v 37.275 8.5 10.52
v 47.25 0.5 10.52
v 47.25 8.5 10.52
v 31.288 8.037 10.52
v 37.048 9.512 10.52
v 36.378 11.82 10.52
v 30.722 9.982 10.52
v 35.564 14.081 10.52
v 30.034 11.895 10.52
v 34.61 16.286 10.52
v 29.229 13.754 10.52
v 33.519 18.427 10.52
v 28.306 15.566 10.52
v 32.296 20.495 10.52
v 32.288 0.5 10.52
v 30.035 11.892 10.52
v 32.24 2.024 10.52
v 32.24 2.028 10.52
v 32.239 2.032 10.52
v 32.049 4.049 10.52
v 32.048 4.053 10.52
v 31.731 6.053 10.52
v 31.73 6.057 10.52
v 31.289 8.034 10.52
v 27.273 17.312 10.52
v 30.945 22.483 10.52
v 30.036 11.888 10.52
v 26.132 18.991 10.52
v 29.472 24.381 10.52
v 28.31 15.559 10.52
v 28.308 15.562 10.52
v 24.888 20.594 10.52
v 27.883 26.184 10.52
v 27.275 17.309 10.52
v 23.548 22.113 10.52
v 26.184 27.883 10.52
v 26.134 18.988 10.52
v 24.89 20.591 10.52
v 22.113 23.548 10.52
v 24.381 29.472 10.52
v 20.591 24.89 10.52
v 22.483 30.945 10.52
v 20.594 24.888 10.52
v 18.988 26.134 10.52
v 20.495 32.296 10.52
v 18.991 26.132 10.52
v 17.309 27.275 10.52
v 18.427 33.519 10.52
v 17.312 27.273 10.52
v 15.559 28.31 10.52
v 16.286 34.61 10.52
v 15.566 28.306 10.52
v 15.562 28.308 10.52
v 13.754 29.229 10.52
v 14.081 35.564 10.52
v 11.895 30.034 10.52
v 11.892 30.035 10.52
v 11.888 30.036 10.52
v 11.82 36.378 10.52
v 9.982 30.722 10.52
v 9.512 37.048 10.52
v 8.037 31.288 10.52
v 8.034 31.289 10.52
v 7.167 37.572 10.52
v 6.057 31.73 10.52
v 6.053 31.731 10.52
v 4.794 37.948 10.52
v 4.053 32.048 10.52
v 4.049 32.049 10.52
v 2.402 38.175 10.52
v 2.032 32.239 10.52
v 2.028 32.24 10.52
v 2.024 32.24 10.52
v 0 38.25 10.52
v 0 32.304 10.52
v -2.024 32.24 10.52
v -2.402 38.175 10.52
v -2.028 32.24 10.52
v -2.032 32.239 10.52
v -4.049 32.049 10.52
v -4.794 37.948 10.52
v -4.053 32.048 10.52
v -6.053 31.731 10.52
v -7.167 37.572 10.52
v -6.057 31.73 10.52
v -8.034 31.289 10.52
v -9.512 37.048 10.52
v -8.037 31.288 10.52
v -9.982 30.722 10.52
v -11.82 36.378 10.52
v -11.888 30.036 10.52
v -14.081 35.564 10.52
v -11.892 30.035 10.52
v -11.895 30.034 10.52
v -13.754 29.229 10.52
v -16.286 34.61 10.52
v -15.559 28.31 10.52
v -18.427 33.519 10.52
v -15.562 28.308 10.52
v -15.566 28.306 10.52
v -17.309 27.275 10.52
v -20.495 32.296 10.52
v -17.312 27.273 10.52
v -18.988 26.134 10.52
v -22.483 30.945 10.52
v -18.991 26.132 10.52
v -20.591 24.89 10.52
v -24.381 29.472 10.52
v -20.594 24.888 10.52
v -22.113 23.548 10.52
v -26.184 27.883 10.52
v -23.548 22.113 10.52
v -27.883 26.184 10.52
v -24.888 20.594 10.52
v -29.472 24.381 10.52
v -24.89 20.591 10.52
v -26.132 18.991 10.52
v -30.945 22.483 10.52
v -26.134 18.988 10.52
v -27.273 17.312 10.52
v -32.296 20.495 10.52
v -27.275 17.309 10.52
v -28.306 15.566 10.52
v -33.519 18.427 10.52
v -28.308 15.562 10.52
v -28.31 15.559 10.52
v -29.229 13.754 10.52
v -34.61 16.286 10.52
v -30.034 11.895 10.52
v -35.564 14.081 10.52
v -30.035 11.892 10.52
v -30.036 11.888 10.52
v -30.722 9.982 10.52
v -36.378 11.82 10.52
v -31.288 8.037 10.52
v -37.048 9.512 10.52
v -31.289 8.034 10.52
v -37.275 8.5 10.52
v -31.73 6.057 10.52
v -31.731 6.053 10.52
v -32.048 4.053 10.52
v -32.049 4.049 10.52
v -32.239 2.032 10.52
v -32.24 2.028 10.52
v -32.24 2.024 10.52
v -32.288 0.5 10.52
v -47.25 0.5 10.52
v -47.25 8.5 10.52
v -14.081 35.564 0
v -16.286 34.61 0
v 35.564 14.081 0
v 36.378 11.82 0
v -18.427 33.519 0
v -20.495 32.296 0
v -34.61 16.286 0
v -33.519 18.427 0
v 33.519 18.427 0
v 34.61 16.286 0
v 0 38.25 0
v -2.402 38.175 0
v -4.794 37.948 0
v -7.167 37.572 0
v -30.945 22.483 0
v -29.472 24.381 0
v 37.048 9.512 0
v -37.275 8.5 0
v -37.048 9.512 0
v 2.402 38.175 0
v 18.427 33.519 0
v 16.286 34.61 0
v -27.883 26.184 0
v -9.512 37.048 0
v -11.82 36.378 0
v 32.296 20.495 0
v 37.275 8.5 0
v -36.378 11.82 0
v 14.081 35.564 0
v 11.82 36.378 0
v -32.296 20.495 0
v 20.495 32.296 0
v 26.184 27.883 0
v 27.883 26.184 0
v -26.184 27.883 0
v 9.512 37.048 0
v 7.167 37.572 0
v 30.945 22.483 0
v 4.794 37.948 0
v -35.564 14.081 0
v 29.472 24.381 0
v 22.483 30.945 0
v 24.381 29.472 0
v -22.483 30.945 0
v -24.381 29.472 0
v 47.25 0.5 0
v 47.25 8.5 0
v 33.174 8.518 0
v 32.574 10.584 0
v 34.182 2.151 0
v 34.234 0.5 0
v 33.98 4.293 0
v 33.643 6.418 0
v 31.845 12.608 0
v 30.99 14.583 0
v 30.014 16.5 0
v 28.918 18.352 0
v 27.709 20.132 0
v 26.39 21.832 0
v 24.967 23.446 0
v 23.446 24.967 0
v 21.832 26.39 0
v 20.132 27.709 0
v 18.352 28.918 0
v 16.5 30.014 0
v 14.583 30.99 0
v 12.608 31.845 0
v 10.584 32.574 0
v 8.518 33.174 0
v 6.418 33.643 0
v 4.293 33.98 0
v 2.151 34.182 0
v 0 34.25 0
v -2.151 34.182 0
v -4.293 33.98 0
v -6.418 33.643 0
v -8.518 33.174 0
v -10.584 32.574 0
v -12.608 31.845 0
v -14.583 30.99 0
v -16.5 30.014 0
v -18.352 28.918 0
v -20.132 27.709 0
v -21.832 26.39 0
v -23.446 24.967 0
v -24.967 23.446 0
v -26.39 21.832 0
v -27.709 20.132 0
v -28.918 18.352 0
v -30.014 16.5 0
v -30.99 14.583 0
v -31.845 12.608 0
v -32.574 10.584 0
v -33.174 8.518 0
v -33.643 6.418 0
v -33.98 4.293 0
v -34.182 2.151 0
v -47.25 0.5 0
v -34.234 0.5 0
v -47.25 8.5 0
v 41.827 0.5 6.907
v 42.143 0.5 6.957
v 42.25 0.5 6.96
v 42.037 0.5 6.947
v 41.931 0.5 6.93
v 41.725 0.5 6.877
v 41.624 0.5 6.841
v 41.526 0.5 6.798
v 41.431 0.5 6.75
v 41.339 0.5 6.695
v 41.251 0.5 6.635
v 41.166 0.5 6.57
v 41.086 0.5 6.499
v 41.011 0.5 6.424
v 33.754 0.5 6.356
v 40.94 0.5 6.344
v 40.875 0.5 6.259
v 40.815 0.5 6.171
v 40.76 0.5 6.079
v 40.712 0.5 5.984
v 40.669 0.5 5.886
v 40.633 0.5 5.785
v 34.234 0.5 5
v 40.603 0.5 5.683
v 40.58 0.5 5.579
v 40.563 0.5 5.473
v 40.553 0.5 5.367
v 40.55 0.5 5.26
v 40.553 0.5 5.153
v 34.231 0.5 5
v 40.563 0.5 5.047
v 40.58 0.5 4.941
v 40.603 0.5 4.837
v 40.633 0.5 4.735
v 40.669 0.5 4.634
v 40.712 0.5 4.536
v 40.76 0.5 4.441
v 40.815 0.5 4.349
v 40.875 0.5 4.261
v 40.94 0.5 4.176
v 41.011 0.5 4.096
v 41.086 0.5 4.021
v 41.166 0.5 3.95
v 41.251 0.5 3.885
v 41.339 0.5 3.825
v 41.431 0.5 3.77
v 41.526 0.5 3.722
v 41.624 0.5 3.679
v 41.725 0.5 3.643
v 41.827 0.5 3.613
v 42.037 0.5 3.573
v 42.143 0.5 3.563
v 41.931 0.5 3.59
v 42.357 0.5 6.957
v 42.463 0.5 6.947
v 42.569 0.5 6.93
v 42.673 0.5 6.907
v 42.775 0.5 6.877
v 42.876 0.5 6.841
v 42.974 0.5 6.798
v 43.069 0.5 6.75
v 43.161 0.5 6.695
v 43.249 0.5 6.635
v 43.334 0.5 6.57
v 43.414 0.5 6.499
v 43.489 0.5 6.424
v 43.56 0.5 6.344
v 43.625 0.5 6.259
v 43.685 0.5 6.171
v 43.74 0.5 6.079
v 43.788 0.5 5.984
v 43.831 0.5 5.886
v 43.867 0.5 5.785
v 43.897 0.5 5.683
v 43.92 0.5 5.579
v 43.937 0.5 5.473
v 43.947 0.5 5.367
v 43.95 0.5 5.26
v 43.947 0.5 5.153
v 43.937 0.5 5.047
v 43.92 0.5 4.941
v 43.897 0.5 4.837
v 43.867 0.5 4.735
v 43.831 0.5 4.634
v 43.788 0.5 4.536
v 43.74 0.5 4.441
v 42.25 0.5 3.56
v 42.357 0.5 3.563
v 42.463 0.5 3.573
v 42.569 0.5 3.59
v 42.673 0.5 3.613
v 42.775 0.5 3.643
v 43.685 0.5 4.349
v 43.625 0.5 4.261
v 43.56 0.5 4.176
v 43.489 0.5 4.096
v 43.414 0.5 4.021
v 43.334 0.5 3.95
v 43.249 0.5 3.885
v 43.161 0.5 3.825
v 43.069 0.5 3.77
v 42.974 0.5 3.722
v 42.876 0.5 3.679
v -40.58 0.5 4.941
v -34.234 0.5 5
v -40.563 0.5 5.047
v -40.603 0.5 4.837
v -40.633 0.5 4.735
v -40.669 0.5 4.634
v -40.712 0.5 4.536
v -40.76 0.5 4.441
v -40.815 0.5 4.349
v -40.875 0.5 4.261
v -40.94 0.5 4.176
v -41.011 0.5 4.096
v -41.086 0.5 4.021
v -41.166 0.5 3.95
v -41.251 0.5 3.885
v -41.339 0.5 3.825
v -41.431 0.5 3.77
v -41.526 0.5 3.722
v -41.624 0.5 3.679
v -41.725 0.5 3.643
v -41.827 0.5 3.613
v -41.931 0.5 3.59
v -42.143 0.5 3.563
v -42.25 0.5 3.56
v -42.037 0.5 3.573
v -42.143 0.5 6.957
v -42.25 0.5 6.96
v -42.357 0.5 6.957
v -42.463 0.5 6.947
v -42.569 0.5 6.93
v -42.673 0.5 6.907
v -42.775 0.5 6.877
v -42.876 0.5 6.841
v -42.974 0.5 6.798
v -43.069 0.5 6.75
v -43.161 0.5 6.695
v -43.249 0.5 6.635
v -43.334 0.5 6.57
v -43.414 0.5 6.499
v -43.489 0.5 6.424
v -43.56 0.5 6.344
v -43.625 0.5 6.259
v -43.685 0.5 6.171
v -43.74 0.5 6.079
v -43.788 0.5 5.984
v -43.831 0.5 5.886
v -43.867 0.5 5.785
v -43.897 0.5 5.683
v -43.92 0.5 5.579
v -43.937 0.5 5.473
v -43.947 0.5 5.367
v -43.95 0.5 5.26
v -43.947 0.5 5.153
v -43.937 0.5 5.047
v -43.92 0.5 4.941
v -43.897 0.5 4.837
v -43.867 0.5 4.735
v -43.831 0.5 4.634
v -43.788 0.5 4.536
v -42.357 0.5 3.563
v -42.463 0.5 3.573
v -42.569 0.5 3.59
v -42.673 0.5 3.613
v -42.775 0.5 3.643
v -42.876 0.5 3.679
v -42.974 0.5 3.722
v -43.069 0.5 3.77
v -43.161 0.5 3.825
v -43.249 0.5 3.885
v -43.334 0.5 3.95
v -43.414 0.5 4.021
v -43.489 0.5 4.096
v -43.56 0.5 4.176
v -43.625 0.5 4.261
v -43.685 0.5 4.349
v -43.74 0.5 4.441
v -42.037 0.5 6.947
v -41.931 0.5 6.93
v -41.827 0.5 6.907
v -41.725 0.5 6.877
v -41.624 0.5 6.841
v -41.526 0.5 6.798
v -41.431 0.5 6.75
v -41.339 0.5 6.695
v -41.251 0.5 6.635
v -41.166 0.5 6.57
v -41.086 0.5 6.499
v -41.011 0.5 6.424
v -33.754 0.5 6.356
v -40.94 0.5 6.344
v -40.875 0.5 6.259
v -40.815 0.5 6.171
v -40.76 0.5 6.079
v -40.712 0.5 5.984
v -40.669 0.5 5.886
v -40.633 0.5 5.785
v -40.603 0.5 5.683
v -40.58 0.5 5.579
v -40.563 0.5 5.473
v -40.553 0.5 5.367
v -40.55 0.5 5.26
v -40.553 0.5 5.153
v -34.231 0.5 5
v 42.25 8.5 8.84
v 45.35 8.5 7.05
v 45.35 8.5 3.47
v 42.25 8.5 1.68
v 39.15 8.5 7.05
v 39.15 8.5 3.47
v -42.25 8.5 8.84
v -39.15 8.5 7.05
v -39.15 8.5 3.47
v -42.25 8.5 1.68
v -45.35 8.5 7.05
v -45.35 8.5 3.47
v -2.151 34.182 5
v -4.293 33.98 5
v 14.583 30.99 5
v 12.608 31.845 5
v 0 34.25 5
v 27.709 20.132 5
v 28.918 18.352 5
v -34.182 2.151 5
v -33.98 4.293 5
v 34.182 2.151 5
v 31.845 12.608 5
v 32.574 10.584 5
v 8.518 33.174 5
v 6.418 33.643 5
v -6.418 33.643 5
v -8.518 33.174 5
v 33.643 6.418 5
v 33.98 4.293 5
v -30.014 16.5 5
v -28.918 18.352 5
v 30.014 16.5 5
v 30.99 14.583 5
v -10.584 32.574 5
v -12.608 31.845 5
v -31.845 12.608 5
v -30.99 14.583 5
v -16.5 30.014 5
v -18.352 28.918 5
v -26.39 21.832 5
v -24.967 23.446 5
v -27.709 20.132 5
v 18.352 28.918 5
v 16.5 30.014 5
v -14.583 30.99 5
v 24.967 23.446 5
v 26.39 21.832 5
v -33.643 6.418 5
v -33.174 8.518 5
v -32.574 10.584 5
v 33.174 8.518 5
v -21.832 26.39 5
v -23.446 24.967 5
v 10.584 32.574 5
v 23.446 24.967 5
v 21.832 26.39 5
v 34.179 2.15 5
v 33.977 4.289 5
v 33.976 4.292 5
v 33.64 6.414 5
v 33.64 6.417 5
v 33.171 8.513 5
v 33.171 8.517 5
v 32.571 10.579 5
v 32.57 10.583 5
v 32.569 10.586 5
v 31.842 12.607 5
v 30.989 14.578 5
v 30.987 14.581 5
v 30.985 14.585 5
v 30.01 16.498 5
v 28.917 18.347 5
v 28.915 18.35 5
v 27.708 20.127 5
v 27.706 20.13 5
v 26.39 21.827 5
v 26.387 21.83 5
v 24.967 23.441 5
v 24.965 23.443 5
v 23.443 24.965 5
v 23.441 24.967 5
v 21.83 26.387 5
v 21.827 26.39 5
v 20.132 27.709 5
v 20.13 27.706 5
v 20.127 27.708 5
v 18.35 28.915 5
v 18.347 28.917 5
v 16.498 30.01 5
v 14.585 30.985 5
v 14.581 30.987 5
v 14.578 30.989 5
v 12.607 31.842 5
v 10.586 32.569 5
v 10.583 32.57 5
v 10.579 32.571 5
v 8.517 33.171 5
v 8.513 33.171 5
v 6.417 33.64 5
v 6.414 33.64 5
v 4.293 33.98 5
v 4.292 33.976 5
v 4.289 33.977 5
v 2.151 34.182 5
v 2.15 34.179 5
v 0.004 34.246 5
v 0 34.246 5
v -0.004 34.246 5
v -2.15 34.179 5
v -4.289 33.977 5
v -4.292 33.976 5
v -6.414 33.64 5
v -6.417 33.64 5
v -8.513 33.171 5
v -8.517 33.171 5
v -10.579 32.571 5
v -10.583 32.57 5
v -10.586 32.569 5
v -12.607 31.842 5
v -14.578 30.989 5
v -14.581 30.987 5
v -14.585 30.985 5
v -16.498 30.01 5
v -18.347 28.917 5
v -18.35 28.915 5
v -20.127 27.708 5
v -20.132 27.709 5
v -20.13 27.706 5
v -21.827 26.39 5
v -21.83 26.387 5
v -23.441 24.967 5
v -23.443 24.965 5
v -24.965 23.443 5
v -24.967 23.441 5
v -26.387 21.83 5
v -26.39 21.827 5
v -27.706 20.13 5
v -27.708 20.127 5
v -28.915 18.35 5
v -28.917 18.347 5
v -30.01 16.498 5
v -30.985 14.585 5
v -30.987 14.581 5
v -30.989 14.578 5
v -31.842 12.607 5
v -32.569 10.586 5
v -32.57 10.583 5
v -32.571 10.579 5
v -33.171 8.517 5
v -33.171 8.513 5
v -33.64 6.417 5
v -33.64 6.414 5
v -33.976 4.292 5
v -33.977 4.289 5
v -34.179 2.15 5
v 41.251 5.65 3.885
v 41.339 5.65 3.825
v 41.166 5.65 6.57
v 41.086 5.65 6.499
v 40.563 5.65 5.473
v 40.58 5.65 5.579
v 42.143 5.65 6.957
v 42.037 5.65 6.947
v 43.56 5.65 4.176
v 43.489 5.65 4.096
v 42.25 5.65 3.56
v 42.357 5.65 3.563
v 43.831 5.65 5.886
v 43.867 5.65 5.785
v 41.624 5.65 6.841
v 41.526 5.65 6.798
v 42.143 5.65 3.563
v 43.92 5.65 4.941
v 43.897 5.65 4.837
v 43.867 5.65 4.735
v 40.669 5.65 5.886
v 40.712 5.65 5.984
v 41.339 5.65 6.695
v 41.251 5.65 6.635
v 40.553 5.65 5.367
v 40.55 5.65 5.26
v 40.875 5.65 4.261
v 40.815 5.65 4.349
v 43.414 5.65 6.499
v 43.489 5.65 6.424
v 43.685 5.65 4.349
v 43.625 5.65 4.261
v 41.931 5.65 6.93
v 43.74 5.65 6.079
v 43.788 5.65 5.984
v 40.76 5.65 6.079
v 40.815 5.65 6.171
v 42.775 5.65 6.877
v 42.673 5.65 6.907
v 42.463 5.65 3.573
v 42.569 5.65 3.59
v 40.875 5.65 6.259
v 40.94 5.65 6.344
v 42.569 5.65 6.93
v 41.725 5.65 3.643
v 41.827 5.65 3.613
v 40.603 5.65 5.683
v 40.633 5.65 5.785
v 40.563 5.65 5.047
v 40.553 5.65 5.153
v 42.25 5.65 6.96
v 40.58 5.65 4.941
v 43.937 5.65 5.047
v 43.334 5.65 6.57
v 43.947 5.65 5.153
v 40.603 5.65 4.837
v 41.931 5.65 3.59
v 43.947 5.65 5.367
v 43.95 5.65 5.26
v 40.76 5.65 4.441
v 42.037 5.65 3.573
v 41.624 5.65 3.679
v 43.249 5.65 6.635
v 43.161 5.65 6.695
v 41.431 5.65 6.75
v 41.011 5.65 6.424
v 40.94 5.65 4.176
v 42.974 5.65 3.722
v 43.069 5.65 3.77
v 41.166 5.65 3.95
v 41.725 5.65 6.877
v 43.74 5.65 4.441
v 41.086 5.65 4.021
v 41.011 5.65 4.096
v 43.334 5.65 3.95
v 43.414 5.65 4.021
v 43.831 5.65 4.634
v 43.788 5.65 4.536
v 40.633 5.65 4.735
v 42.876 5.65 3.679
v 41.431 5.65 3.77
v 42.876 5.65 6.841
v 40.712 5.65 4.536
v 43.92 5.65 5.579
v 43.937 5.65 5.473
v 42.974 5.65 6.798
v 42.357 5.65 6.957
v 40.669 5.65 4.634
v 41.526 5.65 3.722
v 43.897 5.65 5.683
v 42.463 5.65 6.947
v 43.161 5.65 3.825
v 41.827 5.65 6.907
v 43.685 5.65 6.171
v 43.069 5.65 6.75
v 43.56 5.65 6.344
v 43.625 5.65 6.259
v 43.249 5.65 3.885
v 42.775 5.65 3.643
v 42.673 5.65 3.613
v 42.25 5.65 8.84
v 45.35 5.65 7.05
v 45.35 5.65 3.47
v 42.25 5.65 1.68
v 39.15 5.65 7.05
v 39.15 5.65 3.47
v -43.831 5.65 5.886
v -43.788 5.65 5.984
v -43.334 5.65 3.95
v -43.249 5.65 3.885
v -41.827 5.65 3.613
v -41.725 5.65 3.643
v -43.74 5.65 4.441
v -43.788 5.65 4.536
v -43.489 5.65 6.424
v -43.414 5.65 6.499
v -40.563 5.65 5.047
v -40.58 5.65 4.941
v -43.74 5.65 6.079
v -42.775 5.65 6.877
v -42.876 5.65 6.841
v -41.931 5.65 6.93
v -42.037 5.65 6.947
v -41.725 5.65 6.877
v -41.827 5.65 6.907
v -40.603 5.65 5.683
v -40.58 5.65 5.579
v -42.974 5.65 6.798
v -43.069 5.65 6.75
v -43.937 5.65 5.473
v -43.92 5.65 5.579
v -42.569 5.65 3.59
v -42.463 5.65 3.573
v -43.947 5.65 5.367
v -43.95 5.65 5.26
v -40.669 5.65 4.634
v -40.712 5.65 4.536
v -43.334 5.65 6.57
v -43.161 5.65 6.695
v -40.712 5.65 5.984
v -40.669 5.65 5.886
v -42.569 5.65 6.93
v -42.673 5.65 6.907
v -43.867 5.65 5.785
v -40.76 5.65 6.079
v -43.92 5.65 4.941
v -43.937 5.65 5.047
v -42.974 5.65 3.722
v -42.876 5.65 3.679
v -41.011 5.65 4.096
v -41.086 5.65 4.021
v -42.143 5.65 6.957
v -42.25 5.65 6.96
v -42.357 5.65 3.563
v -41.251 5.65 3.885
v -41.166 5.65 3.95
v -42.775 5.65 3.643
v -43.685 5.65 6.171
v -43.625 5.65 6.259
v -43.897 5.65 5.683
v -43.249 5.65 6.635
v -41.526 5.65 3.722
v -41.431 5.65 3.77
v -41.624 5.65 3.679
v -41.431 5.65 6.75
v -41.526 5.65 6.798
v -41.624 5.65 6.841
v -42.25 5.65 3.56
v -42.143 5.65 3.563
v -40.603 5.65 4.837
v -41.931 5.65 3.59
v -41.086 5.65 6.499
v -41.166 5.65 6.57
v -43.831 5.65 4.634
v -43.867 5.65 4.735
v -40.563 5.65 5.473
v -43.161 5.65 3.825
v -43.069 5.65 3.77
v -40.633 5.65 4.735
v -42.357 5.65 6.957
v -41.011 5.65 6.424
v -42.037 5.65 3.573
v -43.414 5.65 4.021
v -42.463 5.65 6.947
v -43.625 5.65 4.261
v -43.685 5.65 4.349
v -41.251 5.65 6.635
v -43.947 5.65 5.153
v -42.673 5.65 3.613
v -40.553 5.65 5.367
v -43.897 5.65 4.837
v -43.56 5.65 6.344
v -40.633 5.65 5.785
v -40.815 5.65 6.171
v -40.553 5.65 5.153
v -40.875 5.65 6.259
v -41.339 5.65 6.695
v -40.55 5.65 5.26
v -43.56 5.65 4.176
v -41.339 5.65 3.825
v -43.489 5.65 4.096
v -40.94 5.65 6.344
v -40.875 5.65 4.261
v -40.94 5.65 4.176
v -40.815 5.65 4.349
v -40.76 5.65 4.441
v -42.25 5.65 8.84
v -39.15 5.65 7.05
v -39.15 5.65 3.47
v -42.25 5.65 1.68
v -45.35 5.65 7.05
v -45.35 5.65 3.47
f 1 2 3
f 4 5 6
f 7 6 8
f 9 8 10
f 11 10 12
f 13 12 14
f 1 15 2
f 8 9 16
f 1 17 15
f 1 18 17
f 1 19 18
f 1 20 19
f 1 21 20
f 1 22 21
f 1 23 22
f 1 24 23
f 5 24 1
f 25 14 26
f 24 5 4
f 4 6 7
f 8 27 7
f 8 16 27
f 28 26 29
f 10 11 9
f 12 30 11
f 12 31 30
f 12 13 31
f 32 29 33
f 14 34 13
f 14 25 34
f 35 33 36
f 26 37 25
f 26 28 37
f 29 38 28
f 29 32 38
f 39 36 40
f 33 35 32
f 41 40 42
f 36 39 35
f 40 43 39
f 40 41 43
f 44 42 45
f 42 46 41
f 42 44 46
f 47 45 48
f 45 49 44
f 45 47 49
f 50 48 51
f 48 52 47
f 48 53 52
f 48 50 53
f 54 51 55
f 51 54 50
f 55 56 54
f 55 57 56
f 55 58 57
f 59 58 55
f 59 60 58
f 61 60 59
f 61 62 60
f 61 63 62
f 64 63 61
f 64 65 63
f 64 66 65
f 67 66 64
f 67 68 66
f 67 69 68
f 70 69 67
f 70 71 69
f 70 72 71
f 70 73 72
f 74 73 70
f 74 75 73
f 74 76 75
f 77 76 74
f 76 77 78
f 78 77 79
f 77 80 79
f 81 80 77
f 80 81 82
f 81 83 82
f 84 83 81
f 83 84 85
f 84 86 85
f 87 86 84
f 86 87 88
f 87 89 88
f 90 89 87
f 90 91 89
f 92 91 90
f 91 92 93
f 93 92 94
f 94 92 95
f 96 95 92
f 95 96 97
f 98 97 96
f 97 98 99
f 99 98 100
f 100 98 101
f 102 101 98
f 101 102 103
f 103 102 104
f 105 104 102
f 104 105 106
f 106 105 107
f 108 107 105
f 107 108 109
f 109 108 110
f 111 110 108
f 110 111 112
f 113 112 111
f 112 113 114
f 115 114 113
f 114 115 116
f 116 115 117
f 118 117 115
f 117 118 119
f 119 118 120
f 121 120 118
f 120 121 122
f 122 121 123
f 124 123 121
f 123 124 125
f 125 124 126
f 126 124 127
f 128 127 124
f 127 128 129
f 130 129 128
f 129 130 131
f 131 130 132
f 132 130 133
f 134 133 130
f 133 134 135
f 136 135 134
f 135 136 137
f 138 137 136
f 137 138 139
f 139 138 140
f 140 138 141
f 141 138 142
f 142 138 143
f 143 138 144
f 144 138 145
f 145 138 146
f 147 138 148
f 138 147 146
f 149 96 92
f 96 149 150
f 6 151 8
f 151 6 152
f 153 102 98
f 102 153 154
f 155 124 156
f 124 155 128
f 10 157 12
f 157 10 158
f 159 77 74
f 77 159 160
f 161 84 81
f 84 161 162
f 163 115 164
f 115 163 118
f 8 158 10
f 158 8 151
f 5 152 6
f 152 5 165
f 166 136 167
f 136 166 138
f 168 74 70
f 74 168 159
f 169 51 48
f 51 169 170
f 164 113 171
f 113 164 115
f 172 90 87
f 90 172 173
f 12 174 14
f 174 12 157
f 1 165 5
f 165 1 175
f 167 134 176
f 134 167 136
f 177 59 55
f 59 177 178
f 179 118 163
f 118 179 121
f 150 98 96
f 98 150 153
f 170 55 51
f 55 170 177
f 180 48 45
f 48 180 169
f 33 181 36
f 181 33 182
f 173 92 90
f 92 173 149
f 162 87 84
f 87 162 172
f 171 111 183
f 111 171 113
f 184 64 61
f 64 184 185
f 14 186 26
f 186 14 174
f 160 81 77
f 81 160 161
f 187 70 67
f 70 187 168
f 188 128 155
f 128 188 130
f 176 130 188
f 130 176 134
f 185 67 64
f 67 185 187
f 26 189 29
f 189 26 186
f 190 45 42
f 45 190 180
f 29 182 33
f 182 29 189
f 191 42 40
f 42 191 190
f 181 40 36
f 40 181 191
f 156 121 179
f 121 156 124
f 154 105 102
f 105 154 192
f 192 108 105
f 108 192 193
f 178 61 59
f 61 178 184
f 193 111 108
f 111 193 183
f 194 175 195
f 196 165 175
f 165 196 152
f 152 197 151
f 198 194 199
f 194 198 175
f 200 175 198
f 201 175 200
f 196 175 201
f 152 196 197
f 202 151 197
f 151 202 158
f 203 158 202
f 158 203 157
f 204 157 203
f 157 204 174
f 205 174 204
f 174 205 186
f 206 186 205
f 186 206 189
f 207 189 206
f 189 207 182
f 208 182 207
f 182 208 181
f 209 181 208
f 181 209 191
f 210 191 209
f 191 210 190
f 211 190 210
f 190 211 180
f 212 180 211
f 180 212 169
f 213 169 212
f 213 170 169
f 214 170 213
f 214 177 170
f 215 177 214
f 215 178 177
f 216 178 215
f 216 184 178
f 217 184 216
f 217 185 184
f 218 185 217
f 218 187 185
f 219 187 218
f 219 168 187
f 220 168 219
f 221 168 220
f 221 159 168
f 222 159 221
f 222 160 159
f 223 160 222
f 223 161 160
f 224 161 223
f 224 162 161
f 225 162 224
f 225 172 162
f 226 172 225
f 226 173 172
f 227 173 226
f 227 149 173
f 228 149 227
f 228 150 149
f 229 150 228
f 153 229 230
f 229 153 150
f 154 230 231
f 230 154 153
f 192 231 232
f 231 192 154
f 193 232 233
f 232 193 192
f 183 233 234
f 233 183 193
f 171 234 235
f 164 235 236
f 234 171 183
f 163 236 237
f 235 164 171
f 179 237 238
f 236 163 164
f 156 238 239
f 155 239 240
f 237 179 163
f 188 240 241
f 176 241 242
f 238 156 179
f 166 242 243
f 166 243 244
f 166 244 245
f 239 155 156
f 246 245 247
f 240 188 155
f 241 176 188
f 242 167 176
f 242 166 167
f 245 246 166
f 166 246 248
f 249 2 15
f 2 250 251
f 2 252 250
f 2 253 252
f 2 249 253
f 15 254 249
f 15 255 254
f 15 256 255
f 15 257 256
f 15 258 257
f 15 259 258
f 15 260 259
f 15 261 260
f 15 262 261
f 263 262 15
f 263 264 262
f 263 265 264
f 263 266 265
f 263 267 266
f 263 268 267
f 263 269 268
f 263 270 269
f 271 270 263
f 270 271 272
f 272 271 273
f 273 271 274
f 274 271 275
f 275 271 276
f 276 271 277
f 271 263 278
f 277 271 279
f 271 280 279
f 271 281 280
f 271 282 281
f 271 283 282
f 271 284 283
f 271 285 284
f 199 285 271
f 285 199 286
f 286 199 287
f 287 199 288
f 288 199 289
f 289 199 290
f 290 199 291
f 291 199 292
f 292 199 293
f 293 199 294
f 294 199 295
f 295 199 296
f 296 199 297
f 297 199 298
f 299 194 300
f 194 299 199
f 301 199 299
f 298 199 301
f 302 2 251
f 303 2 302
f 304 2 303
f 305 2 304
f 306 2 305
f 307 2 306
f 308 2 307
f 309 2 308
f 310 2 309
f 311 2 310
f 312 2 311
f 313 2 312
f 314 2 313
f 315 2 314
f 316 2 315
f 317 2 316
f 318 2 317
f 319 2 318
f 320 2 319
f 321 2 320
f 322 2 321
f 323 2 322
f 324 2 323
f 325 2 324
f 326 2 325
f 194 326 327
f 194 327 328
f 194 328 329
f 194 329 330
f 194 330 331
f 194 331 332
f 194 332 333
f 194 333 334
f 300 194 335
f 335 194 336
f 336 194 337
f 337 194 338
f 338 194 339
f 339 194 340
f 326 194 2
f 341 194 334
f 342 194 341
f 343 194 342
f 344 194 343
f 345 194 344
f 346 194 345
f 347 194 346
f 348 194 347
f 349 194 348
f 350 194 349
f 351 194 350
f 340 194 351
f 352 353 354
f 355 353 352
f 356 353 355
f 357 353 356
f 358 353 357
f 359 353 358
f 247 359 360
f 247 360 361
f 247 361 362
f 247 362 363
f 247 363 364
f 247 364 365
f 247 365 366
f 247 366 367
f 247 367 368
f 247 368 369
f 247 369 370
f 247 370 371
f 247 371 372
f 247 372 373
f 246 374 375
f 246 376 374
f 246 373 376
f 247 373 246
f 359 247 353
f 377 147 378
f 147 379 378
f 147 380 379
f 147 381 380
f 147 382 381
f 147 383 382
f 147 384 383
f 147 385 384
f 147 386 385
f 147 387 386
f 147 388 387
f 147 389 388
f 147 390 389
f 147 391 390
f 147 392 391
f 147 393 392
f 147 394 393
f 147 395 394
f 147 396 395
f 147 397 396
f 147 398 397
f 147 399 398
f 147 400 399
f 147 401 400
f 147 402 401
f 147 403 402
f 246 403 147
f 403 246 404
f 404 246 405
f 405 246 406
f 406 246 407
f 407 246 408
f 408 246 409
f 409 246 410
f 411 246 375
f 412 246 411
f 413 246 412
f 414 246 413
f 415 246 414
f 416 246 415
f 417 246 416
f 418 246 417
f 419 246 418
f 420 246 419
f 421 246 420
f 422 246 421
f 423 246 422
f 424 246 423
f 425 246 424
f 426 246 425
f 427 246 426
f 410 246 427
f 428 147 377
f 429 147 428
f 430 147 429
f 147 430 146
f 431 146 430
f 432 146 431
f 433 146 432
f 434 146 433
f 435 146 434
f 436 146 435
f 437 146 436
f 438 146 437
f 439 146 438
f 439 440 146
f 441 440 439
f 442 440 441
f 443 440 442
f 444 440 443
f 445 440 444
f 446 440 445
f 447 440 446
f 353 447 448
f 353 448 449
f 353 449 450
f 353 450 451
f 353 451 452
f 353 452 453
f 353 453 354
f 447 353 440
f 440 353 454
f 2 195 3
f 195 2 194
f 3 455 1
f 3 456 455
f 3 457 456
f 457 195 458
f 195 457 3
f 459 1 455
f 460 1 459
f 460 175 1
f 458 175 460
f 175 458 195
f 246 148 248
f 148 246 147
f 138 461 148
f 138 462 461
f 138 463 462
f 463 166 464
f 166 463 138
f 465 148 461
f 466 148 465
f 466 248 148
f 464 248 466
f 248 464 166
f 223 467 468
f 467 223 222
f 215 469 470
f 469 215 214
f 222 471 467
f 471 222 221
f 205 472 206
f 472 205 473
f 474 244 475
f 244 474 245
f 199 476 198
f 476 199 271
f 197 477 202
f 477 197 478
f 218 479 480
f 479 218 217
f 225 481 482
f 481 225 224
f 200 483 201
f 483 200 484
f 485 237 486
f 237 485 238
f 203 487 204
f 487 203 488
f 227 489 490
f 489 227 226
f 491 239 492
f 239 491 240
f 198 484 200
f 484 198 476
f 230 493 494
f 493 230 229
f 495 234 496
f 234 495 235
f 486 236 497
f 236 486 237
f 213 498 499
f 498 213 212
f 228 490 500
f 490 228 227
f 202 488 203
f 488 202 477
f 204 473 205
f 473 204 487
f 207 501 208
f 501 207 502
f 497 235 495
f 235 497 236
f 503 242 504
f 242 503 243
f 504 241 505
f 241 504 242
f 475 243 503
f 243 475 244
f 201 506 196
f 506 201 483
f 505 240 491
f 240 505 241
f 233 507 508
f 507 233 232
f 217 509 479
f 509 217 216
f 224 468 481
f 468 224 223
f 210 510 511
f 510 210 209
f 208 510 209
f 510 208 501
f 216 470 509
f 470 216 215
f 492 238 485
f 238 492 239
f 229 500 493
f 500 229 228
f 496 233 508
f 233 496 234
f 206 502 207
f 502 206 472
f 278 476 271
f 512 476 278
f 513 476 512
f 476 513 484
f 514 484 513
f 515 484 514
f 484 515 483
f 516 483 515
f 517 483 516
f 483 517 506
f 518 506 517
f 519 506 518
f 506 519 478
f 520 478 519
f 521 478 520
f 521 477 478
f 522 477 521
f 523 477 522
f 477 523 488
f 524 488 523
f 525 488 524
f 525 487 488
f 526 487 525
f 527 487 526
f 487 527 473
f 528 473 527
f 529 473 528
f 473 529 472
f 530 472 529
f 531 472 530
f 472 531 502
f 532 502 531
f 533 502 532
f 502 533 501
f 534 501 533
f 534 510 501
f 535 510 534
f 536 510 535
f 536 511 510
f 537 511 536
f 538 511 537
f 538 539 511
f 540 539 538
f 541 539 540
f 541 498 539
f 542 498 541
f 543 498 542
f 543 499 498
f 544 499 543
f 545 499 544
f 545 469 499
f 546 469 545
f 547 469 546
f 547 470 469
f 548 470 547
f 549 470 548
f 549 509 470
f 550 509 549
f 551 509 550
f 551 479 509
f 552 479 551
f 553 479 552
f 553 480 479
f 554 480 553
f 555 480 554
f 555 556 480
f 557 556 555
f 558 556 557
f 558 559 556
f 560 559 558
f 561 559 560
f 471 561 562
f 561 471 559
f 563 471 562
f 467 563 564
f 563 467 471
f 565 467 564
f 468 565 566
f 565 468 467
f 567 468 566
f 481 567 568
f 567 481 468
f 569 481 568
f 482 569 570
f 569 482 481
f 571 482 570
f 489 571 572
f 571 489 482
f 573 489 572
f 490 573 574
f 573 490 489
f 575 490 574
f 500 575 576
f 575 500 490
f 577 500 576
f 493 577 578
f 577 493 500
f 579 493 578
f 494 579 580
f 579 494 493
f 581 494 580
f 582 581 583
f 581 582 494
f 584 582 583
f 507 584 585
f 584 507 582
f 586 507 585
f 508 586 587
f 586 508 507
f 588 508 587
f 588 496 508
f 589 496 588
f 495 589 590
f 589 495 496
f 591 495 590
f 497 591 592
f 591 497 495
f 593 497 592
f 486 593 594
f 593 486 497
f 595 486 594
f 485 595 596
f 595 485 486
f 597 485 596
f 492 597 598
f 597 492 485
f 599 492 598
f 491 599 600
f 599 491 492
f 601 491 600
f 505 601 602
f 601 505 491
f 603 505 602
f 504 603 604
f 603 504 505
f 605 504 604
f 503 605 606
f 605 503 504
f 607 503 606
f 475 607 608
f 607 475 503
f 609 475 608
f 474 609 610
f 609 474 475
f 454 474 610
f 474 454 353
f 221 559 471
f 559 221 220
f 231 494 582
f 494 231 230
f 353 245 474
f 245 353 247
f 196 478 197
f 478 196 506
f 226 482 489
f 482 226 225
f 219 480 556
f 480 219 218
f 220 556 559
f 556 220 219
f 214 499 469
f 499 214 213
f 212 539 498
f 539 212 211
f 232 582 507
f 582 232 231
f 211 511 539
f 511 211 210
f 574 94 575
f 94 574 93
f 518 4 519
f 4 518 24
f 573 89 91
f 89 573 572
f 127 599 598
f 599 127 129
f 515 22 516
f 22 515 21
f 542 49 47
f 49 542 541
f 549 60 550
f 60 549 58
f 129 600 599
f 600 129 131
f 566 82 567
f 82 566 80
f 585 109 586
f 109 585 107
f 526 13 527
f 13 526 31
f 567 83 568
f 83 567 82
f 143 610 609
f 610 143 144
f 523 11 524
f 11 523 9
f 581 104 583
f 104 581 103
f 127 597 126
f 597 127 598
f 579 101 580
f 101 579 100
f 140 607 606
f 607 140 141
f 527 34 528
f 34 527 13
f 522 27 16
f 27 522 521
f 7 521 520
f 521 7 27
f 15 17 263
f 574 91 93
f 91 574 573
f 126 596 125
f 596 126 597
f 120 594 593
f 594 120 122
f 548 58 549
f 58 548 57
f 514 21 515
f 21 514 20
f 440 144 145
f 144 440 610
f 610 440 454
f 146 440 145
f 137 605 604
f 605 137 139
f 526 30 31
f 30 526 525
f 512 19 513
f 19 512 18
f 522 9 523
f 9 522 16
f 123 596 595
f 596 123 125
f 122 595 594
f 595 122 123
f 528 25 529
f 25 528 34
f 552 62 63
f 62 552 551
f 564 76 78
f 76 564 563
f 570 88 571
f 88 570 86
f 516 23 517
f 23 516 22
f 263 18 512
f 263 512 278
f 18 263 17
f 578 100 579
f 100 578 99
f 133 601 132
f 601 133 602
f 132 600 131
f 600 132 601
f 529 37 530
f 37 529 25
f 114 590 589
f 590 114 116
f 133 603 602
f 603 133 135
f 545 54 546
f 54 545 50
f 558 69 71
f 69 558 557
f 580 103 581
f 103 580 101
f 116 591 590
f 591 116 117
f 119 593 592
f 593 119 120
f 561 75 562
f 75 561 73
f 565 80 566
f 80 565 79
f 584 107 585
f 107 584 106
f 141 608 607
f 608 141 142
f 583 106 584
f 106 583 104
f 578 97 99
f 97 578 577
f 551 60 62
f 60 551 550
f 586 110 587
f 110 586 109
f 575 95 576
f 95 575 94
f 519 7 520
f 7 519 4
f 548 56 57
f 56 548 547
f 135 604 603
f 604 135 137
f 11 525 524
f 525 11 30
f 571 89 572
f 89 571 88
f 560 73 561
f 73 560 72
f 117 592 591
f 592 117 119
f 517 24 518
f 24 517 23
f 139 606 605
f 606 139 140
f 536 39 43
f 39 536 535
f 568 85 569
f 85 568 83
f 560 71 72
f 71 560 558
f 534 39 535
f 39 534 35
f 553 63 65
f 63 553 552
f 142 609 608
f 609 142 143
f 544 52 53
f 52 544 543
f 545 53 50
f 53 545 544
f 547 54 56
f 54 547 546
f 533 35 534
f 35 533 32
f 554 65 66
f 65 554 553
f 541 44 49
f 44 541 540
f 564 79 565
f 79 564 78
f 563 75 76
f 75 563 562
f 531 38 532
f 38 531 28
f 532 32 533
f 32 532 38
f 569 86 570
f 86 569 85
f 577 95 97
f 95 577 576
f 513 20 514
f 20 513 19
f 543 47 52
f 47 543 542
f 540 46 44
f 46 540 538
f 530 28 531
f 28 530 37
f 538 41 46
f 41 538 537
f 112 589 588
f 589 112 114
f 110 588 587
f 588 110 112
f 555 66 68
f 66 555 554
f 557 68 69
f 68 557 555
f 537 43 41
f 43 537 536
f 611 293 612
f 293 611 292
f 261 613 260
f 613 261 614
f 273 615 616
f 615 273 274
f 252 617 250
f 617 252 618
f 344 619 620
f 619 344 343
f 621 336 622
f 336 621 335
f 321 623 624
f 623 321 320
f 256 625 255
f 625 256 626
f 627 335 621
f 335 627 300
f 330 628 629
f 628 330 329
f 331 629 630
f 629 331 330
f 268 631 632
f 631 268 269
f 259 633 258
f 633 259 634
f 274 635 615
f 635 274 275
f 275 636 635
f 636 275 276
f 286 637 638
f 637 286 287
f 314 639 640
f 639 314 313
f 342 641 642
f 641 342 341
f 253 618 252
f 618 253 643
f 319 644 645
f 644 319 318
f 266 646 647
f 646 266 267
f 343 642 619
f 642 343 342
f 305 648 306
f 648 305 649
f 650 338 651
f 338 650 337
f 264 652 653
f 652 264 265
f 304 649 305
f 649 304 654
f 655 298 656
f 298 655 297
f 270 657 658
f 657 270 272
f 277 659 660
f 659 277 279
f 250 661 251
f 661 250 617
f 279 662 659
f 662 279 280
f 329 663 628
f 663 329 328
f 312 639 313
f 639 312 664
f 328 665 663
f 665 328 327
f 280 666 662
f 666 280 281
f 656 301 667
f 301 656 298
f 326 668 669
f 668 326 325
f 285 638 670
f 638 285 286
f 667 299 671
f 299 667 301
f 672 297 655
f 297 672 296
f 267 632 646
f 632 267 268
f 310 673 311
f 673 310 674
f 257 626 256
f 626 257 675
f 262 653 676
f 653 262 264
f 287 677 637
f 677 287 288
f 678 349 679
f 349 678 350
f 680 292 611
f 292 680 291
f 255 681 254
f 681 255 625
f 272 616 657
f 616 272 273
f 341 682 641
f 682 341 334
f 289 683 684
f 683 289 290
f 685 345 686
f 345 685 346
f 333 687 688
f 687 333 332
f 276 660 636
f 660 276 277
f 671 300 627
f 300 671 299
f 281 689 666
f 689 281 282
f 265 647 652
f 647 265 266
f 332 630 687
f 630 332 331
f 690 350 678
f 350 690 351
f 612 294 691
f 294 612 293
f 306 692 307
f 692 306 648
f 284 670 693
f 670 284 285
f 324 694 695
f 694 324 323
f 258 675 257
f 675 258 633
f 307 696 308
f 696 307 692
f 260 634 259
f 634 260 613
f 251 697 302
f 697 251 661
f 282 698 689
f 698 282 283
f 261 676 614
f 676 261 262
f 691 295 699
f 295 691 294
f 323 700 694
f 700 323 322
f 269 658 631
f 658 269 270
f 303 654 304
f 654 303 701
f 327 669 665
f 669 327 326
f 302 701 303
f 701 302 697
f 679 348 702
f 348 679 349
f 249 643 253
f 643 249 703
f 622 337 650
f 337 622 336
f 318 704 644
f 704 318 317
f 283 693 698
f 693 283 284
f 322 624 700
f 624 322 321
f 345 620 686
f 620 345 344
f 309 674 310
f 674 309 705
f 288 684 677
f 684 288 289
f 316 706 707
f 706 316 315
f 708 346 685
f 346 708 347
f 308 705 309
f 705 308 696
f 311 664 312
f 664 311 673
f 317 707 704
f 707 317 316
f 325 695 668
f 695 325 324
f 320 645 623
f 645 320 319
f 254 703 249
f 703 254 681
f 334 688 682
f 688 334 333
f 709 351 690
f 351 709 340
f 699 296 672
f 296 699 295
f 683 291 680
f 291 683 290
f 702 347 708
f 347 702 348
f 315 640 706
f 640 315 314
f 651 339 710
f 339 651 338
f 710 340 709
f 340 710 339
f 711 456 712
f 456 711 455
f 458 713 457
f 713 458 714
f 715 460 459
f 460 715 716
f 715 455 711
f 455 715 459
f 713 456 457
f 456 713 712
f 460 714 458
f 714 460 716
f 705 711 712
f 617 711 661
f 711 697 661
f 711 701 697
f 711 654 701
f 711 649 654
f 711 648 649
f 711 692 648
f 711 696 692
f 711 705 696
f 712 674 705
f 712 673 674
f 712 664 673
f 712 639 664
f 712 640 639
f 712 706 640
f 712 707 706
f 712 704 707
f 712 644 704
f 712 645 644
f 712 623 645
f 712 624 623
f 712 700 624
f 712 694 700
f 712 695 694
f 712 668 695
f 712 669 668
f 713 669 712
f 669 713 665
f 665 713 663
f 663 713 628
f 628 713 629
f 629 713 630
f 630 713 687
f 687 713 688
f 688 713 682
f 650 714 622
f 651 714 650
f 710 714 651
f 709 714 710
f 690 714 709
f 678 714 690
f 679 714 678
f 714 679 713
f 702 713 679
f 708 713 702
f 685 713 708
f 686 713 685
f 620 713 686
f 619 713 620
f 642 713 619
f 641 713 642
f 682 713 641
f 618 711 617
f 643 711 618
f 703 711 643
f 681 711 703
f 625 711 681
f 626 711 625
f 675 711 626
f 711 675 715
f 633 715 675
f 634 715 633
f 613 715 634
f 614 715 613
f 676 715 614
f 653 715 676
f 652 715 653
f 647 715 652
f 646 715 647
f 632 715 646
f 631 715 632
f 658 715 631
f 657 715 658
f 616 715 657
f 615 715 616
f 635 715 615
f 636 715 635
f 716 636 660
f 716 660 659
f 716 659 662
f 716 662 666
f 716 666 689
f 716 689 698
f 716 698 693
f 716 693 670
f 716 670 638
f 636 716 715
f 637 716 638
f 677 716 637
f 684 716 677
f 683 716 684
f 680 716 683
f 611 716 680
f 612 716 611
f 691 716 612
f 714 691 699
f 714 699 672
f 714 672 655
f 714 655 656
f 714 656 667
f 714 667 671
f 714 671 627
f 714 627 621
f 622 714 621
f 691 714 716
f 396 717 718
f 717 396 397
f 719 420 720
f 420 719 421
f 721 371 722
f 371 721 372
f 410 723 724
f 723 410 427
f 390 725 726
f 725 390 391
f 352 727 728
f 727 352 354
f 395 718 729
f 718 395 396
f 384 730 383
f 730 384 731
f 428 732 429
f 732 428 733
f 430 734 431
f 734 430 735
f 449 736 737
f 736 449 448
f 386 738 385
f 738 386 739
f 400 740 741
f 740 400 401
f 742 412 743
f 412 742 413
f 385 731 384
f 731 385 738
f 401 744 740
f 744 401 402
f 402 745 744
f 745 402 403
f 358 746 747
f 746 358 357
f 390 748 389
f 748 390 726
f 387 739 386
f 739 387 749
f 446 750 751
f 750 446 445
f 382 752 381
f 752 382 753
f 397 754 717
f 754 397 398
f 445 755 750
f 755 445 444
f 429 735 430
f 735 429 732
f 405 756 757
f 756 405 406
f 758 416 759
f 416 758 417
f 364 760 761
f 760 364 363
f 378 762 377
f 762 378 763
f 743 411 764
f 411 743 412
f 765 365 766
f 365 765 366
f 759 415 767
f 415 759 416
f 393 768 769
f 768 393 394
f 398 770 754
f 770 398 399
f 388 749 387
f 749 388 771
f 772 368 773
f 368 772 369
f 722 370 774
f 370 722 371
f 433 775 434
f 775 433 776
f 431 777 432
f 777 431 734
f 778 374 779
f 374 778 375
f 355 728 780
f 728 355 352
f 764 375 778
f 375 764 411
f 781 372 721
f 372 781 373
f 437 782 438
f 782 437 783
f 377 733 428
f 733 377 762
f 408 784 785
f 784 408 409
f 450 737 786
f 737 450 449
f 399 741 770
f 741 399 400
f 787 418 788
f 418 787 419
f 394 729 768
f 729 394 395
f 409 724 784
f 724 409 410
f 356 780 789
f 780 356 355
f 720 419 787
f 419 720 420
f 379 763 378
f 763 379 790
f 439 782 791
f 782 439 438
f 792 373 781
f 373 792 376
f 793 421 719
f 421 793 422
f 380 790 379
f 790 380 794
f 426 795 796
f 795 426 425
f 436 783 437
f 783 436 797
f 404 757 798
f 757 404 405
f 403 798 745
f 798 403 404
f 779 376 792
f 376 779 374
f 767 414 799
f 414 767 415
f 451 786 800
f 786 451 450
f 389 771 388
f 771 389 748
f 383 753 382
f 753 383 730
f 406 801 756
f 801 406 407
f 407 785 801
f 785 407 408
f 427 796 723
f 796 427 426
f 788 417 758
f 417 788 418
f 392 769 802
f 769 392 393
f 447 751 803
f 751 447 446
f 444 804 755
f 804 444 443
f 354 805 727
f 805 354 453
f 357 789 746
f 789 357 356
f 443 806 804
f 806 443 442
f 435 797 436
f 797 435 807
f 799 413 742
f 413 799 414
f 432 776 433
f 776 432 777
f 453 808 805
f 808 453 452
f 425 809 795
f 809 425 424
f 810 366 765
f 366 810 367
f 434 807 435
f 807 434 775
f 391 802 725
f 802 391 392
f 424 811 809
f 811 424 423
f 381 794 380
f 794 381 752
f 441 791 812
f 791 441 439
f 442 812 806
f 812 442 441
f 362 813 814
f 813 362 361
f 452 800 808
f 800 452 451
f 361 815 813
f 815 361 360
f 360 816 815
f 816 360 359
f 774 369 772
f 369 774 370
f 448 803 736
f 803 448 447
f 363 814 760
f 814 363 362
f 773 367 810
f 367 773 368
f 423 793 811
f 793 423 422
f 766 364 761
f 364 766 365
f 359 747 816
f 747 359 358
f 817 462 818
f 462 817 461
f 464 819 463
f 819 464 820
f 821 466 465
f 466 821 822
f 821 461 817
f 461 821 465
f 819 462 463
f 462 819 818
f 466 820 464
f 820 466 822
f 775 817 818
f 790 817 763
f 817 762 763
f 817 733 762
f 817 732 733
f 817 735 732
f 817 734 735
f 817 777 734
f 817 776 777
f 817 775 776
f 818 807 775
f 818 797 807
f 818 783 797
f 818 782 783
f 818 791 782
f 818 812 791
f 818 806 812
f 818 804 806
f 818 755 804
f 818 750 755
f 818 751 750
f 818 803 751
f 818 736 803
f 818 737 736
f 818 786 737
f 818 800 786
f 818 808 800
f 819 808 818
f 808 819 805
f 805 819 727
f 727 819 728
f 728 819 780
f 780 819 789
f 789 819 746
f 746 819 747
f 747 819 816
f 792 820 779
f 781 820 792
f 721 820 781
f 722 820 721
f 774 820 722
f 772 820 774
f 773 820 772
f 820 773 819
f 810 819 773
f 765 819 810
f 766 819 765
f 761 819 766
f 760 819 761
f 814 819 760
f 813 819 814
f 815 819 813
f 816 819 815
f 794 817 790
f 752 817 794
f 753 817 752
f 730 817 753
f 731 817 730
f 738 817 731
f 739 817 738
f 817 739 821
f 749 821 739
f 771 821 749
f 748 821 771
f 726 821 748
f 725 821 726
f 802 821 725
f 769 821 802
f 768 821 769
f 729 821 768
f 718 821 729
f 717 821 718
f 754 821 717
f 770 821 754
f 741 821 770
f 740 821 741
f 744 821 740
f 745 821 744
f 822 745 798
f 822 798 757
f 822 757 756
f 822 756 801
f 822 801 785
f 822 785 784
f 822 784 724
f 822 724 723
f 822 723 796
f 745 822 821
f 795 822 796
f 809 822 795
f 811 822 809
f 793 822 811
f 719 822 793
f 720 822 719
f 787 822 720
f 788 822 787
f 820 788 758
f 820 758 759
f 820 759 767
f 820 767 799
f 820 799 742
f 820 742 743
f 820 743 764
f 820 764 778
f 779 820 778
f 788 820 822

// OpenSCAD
// ===================================================================
// BMeters GSD8-RFM DN20 - Low-Profile (45-50mm) Tower for XIAO ESP32S3 Sense
// Calibrated Stepped Bore (45-deg Chamfer) + Corrected 1.0mm Pinch Gap
// ===================================================================

$fn = 100;

// --- Part Selector ---
part = "clamp"; // ["assembled", "tower", "clamp"]

// --- Calibrated Meter Profile ---
d_top       = 64.6;   // Upper rim bore (measured 64.34mm + clearance)
d_shelf     = 68.5;   // Lower skirt bore (measured 68.11mm + clearance)
h_drop      = 5.52;   // Drop height above shelf to top rim
h_skirt     = 5.0;    // Skirt depth below shelf
collar_h    = h_drop + h_skirt; // Total collar height (~10.5mm)

wall_th     = 4.0;
r_out       = (d_shelf / 2) + wall_th;

// --- Corrected Pinch Gap ---
// Total air gap between mating faces = 1.0mm (0.5mm setback per side)
pinch_gap   = 1.0;
y_cut       = pinch_gap / 2; // 0.5mm

// --- Fasteners (M3) ---
bolt_d      = 3.4;
nut_w       = 6.2;
nut_h       = 2.8;
lug_w       = 10.0;
lug_depth   = 8.0;   // Clean 8mm lug ear depth

// --- Low-Profile Camera Tower Parameters ---
tower_h     = 45.0;   // Lens/plate height above meter base (~50mm total)
leg_w       = 8.0;
leg_th      = 3.5;

// --- Seeed Studio XIAO ESP32S3 Sense Cradle ---
xiao_w      = 18.2;   // Board width (+ tolerance)
xiao_l      = 21.5;   // Board length (+ tolerance)
xiao_depth  = 4.5;    // Depth for board + camera daughterboard sandwich
lens_dia    = 9.5;    // Lens through-hole
tray_wall   = 2.5;

tray_ext_w  = xiao_w + (tray_wall * 2);
tray_ext_l  = xiao_l + (tray_wall * 2);

// ===================================================================
// Top-Level Assembly Dispatcher
// ===================================================================

if (part == "assembled") {
    color("DimGray") tower_half();
    color("SlateGray") clamp_half();
} else if (part == "tower") {
    tower_half();
} else if (part == "clamp") {
    rotate([0, 0, 180]) clamp_half();
}

// ===================================================================
// Module: Tower Half (Front Collar + Legs + XIAO Tray)
// ===================================================================
module tower_half() {
    difference() {
        union() {
            // Front collar shell (cut at Y = +y_cut)
            intersection() {
                cylinder(r = r_out, h = collar_h);
                translate([-r_out - 10, y_cut, 0])
                    cube([(r_out + 10) * 2, r_out + 10, collar_h]);
            }
            // Front bolt lugs flush with cut plane
            collar_lugs(rear = false);

            // Support legs
            support_leg(angle = 45, with_wire_channel = true);
            support_leg(angle = 135, with_wire_channel = false);

            // Elevated XIAO Sense Platform (offset +8mm to center over digit drums)
            translate([0, 8.0, tower_h])
                xiao_tray();
        }

        // Stepped bore with self-supporting 45-degree transition
        stepped_meter_bore();

        // M3 bolt pass-through holes
        lug_holes(rear = false);
    }
}

// ===================================================================
// Module: Clamp Half (Rear Collar)
// ===================================================================
module clamp_half() {
    difference() {
        union() {
            // Rear collar shell (cut at Y = -y_cut)
            intersection() {
                cylinder(r = r_out, h = collar_h);
                translate([-r_out - 10, -r_out - 10 - y_cut, 0])
                    cube([(r_out + 10) * 2, r_out + 10, collar_h]);
            }
            // Rear bolt lugs flush with cut plane
            collar_lugs(rear = true);
        }

        stepped_meter_bore();

        // M3 bolt holes + captive hex nut pockets
        lug_holes(rear = true);
    }
}

// ===================================================================
// Internal Geometry & Mechanical Features
// ===================================================================

module stepped_meter_bore() {
    // 1. Lower wide skirt
    translate([0, 0, -1])
        cylinder(d = d_shelf, h = h_skirt + 1);

    // 2. Smooth internal 45-degree transition up the drop
    translate([0, 0, h_skirt - 0.01])
        cylinder(d1 = d_shelf, d2 = d_top, h = h_drop + 0.02);

    // 3. Top rim clearance
    translate([0, 0, h_skirt + h_drop])
        cylinder(d = d_top, h = collar_h);
}

module collar_lugs(rear = false) {
    y_sign = rear ? -1 : 1;
    for (x_dir = [-1, 1]) {
        // Lugs sit directly on the split plane
        translate([x_dir * (r_out + lug_w / 2 - 1), y_sign * (y_cut + lug_depth / 2), collar_h / 2])
            cube([lug_w, lug_depth, collar_h], center = true);
    }
}

module lug_holes(rear = false) {
    for (x_dir = [-1, 1]) {
        // Continuous bolt axis through both ears
        translate([x_dir * (r_out + lug_w / 2 - 1), 0, collar_h / 2])
            rotate([90, 0, 0])
            cylinder(d = bolt_d, h = 40, center = true);

        // Captive M3 hex nut pocket on the rear face
        if (rear) {
            translate([x_dir * (r_out + lug_w / 2 - 1), -(y_cut + lug_depth - nut_h / 2), collar_h / 2])
                rotate([90, 30, 0])
                cylinder(r = nut_w / (2 * cos(30)), h = nut_h + 0.1, $fn = 6, center = true);
        }
    }
}

module support_leg(angle, with_wire_channel = false) {
    bx = (r_out - 1) * cos(angle);
    by = (r_out - 1) * sin(angle);
    tx = (tray_ext_w / 2 - 2) * cos(angle);
    ty = 8.0 + (tray_ext_l / 2 - 2) * sin(angle);

    difference() {
        hull() {
            translate([bx, by, collar_h - 1])
                cylinder(r = leg_w / 2, h = 1);
            translate([tx, ty, tower_h])
                cylinder(r = leg_w / 2, h = 1);
        }

        // 2.5mm groove along the strut for IR cap wiring
        if (with_wire_channel) {
            hull() {
                translate([bx * 0.95, by * 0.95, collar_h])
                    cylinder(d = 2.5, h = 2);
                translate([tx * 0.95, ty * 0.95, tower_h - 1])
                    cylinder(d = 2.5, h = 2);
            }
        }
    }
}

module xiao_tray() {
    difference() {
        // Outer tray body
        translate([-tray_ext_w / 2, -tray_ext_l / 2, 0])
            cube([tray_ext_w, tray_ext_l, xiao_depth + 2.0]);

        // Pocket for XIAO S3 Sense
        translate([-xiao_w / 2, -xiao_l / 2, 2.0])
            cube([xiao_w, xiao_l, xiao_depth + 1.0]);

        // Central aperture for downward-facing lens
        translate([0, 0, -1])
            cylinder(d = lens_dia, h = 6.0);

        // Horizontal rear cutout for USB-C connector
        translate([-5.5, tray_ext_l / 2 - 4, 2.0])
            cube([11.0, 6.0, xiao_depth + 1.0]);
    }
}
